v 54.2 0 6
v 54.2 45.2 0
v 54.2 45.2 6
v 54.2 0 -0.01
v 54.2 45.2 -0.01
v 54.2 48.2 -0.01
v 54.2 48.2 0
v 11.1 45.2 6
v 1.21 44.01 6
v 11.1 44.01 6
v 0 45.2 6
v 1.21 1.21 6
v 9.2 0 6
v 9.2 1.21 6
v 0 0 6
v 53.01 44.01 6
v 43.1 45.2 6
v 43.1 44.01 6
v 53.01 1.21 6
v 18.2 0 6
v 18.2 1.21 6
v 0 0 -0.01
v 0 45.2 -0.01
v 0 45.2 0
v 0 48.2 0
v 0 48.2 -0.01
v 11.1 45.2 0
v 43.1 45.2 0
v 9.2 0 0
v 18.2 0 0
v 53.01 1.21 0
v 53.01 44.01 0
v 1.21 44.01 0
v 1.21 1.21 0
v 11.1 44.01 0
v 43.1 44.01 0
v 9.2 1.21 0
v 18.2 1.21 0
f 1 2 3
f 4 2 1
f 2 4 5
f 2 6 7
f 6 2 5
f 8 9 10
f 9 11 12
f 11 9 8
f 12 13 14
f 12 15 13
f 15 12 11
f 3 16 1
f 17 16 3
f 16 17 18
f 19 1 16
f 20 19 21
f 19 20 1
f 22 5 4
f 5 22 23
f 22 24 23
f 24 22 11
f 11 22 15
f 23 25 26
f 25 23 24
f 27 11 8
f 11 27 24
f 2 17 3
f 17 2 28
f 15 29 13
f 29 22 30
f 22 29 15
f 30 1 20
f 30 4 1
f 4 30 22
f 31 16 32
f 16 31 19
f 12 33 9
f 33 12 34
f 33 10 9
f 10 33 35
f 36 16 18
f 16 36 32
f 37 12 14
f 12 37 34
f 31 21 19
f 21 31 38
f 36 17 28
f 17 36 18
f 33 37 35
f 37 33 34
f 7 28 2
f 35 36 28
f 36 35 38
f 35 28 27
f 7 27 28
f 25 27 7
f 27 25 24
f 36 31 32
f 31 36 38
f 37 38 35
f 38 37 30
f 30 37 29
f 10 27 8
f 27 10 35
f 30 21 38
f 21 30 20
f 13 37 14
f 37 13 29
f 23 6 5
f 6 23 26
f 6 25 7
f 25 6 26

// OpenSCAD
// file: ../Base/Boxes.scad
// Fischertechnik Box Foundation
// Pre-designed Boxes

use <Constants.scad>

include <PlacementOptions.scad>

box190Width = 190;
box190Depth = 130;
box130Width = 130;
box130Depth = 95;

// Values are from an original ec3 box
topBottomDifference = 1.5;
outerHeight = 40;
baseThickness = 1.8;
innerHeight = outerHeight - baseThickness;
stackExcess = 5.7;
radius = 3.5;
wallThickness = 1.5;
tolerance = 0.2;

boxWallThickness = wallThickness;
boxBaseThickness = baseThickness;
boxWebWidth = 3.0;

// getBoxWallThickness()
// Gets the wall thickness of a Fischertechnik Box
function getBoxWallThickness() = boxWallThickness;

// getBoxUsageHeight(height = 38.2)
// Gets the usable height of a Fischertechnik box
// height = Outer height of the box from the bottom to the upper edge.
function getBoxUsageHeight(height = outerHeight) = height - baseThickness - stackExcess;

// getBoxInnerHeight()
// Gets the inner height of a Fischertechnik box, including the stack excess
function getBoxInnerHeight() = innerHeight;

// getBoxBaseThickness()
// Gets the thickness of the Fischertechnik box base.
function getBoxBaseThickness() = boxBaseThickness;

// getBoxWebWidth()
// Gets the width of a box web
function getBoxWebWidth() = boxWebWidth;

// getBox190Space()
// Gets the usable inner space of a Box 190 as an x/y-list
function getBox190Space() = [
    box190Width - 2*getBoxWallThickness() - topBottomDifference, 
    box190Depth - 2*getBoxWallThickness() - topBottomDifference ];

// RoundedCornerPlate(width, depth, height, radius)
// Creates a body plate with rounded corners for a box. Used
// also to create the complete box with the hull module.
// width = Width of the plate
// depth = depth of the plate 
// height = thickness of the plate
// radius = radius of the rounded corner
module RoundedCornerPlate(width, depth, height, radius) {
    translate([radius, radius])
    hull() {
        w = width-2*radius;
        d = depth-2*radius;
        cube([w, d, height]);
        cylinder(height, r=radius, $fn=getFragments());
        translate([w, 0])
            cylinder(height, r=radius, $fn=getFragments());
        translate([w, d])
            cylinder(height, r=radius, $fn=getFragments());
        translate([0, d])
            cylinder(height, r=radius, $fn=getFragments());
    }
}

// BoxBase(width, depth)
// Creates an empty stackable Fischertechnik compatible box
// width = Outer width of the box (190, 130, ...)
// depth = Outer depth of the box (130, 95, ...)

module BoxBase(width, depth, height=outerHeight) {    
    thinPlate = 0.01;

    innerHeight = height - baseThickness;    
    
    module Body(tolerance=tolerance) {
        hull() {
            // Bottom with tolerance to fit into the original boxes when stacked
            translate([-wallThickness+tolerance, -wallThickness+tolerance, -baseThickness])
                RoundedCornerPlate(width-topBottomDifference-2*tolerance, depth-topBottomDifference-2*tolerance, thinPlate, radius);
            
            // Top
            translate([-wallThickness-topBottomDifference/2, -wallThickness-topBottomDifference/2, innerHeight-thinPlate])
                RoundedCornerPlate(width, depth, thinPlate, radius);
         }
    }

    module Cutoff() {
        hull() {
            coWidth = width - 2*wallThickness;
            coDepth = depth - 2*wallThickness;
            
            // Bottom
            RoundedCornerPlate(coWidth-topBottomDifference, coDepth-topBottomDifference, thinPlate, radius);

            // Top
            translate([-topBottomDifference/2, -topBottomDifference/2, innerHeight+thinPlate]) 
                RoundedCornerPlate(coWidth, coDepth, thinPlate, radius);
        }
    }
    
    difference() {        
        Body();
        Cutoff();
        stackOffset = innerHeight - stackExcess;
        translate([0, 0, stackOffset + baseThickness])
            Body(tolerance=0);
    }
}

// Creates the Fischertechnik empty box 130x190 mm and places it at position 0,0
// 190x130 are the outer sizes, the inner space is slightly smaller. Use getBox190Space() to get the inner sizes.
// The box is positioned that the usable inner space is at the 0,0,0 position.

module Box190() {
    BoxBase(box190Width, box190Depth);
}

// Gets the usable inner space of a Box 130 as an x/y-list
function getBox130Space() = [
    box130Width - 2*getBoxWallThickness() - topBottomDifference, 
    box130Depth - 2*getBoxWallThickness() - topBottomDifference ];

// Creates the Fischertechnik empty box 95x130 mm and places it at position 0,0
// 190x130 are the outer sizes, the inner space is slightly smaller. Use getBox190Space() to get the inner sizes.
// The box is positioned that the usable inner space is at the 0,0,0 position.

module Box130() {
    BoxBase(box130Width, box130Depth);
}

// Creates a web at the specified box walls
// corner 0 = LowerLeft, 1 = UpperLeft, 2 = UpperRight, 3 = LowerRight
// side 0 = LeftOfCorner, 1 = RightOfCorner
// distance = Distance in mm from the corner
// boxSpace = inner width and depth of the box (default: Box 190)
// webWidth = length of the web (default is 3 mms)
// webThickness = thickness of the web (default is 1 mm)
// height = Height of the web (standard is getBoxUsageHeight())
// sink = How much of the web is sunk into the wall

module BoxWeb(
    corner, 
    side, 
    distance, 
    boxSpace=getBox190Space(), 
    webWidth=getBoxWebWidth(), 
    webThickness=1.0, 
    height=getBoxUsageHeight(),
    sink = getBoxWallThickness()/2) {
    width = (corner % 2 == 0) ? 
            (side == LeftOfCorner ? webWidth : webThickness) :
            (side == LeftOfCorner ? webThickness : webWidth);

    depth = (corner % 2 == 0) ? 
            (side == RightOfCorner ? webWidth : webThickness) :
            (side == RightOfCorner ? webThickness : webWidth);
    
    xDiff = corner == LowerLeft ? 
                (side == LeftOfCorner ? -sink : distance) :
            (corner == UpperLeft ?                
                (side == LeftOfCorner ? distance : -sink) :
            (corner == UpperRight ?
                (side == LeftOfCorner ? boxSpace.x-webWidth+sink : boxSpace.x-distance-webThickness) :
                (side == LeftOfCorner ? boxSpace.x-distance-webThickness: boxSpace.x-webWidth+sink)));

    yDiff = corner == LowerLeft ? 
                (side == RightOfCorner ? -sink : distance) :
            (corner == UpperLeft ?
                (side == RightOfCorner ? boxSpace.y-distance-webThickness : boxSpace.y-webWidth+sink) :
            (corner == UpperRight ?
                (side == RightOfCorner ? boxSpace.y-webWidth+sink : boxSpace.y-distance-webThickness) :
                (side == RightOfCorner ? distance : -sink)));
    
    translate([xDiff, yDiff, -getExcess()])
        cube([width, depth, height + 2*getExcess()]);
}
// file: ../Base/Rotation.scad
// Fischertechnik Box Foundation
// Geometry Helpers Rotation

include <PlacementOptions.scad>

// getRotatedSpace(space, rotation=NoRotation)
// Rotates the space dependent on the specified rotation

function getRotatedSpace(space, rotation=NoRotation) = [
    (rotation == Rotate90 || rotation == Rotate270) ? space.y : space.x,
    (rotation == Rotate90 || rotation == Rotate270) ? space.x : space.y
];

// Rotates the given space around the fixed left lower corner
// space = the space the children needs as width/depth list [width,depth]
// rotation = 0 Rotate0 degrees, 1 Rotate90 degrees, 2 Rotate180 degrees, 3 Rotate270 degrees (equivalent to -90)

module RotateFix(space, rotation=NoRotation) {
    dy = (rotation == Rotate0 || rotation == Rotate270) ? 0 :
        (rotation == Rotate90) ? space.x :
        space.y;
    dx = (rotation < Rotate180) ? 0 :
        (rotation == Rotate180) ? space.x :
        space.y;
    
    translate([dx, dy, 0])
        rotate([0, 0, rotations[rotation]])
            children();
}
// file: ../Base/Alignment.scad
// Fischertechnik Box Foundation
// Geometry Helpers Alignment

include <PlacementOptions.scad>

// getAlignedX(elementWidth, spaceWidth, align=AlignRight, offset=0)
// Gets the aligned X offset of an element with the given
// width in the given space.
// elementWidth = The width of the element to positon
// spaceWidth = The space where the element should be aligned
// align = 0 AlignLeft, 1 AlignCenter, 2 AlignRight
// offset = an optional offset from the aligned position. When
// aligned left or centered, then positive values are in X direction.
// When aligned right then positive values are in negative X direction.

function getAlignedX(elementWidth, spaceWidth, align=AlignRight, offset=0) =
    (align == AlignLeft) ?
        offset :
        ((align == AlignCenter) ?
        (spaceWidth - elementWidth)/2 + offset :
        spaceWidth - offset - elementWidth);

// getAlignedY(elementDepth, spaceDepth, align=AlignTop, offset=0)
// Gets the aligned Y offset of an element with the given
// depth in the given space.
// elementDepth = The depth of the element to positon
// spaceDepth = The space where the element should be aligned
// align = 0 AlignBottom, 1 AlignCenter, 2 AlignTop
// offset = an optional offset from the aligned position. When
// aligned bottom or centered, then positive values are in Y direction.
// When aligned top then positive values are in negative Y direction.

function getAlignedY(elementDepth, spaceDepth, align=AlignTop, offset=0) =
    (align == AlignBottom) ?
        offset :
        ((align == AlignCenter) ?
        (spaceDepth - elementDepth)/2 + offset :
        spaceDepth - offset - elementDepth);
// file: ../Base/PlacementOptions.scad
// Fischertechnik Box Foundation
// Placement Options

// Alignment
NoAlign = 0;
AlignLeft = 1;
AlignBottom = 2;
AlignCenter = 3;
AlignRight = 4;
AlignTop = 5;

// Element rotation degree steps
rotations = [0, -90, -180, -270];

// Rotation
NoRotation = 0;
Rotate0 = 0;
Rotate90 = 1;
Rotate180 = 2;
Rotate270 = 3;

// Docking (seen from above)
NoDock = -1;
DockLeft = 0;
DockTop = 1;
DockRight = 2;
DockCorner = 2;
DockBottom = 3;

// Web corners
LowerLeft = 0;
UpperLeft = 1;
UpperRight = 2;
LowerRight = 3;

// Web position relative to corner
LeftOfCorner = 0;
RightOfCorner = 1;
// file: ../Base/Placement.scad
// Fischertechnik Box Foundation
// Geometry Helpers Placement

use <Constants.scad>
use <Alignment.scad>
use <Rotation.scad>
use <Boxes.scad>

include <PlacementOptions.scad>

// Place(x=0, y=0, elementSpace=[0,0], alignX=AlignLeft, alignY=AlignBottom, rotation=Rotate0, boxSpace=getBox190Space())
// Places the child at the specified position
// y = Y-Position. This is a relative position when an X aligment is specified.
// x = X-Position. This is a relative position when an Y aligment is specified.
// elementSpace = space of the element to be placed [x,y]
// alignX = -1=NoAlign, 0 AlignLeft, 1 AlignCenter, 3 AlignRight (elementSpace and boxSpace required!)
// alignY = -1=NoAlign, 2 AlignBottom, 1 AlignCenter, 4 AlignTop (elementSpace and boxSpace required!)
// rotation = 0 Rotate0 0 degrees, 1 Rotate90 90 degrees, 
// 2 Rotate180 180 degrees, 3 Rotate270 270 degrees (equivalent to -90)
// boxSpace = Inner space of the box where the placement occurs [x,y] - default is Box 190x130 inner space

module Place(x=0, y=0, elementSpace=[0,0], 
  alignX=AlignLeft, alignY=AlignBottom, 
  rotation=NoRotation, boxSpace=getBox190Space()) {

    module Position(x, y, space, rotation=Rotate0) {
        translate([x, y, 0])
            RotateFix(space, rotation)
                children();
    }

    space = getRotatedSpace(elementSpace, rotation);
    alignedX = getAlignedX(space.x, boxSpace.x, alignX, x);
    alignedY = getAlignedY(space.y, boxSpace.y, alignY, y);
    Position(alignedX, alignedY, elementSpace, rotation)
        children();
}

// Center(space=getBox130Space(), elementSpace=[0,0])
// space = Space where the children is centered. For cylinder use centered=true and no elementSpace.
// elementSpace = space of the element to be centered [x,y]

module Center(space=getBox190Space(), elementSpace=[0,0]) {
    Place(elementSpace=elementSpace, boxSpace=space, alignX=AlignCenter, alignY=AlignCenter)
        children();
}

// CenterHorizontal(width=0, y=0, offset=0, space=getBox130Space())
// width = Width of the element to be placed.
// y = Y position of the element
// offset = Offset from the center position (negative will be left of the center)
// space = Space where the element is placed

module CenterHorizontal(width=0, y=0, offset=0, space=getBox190Space()) {
    Place(x=offset, y=y, elementSpace=[width, 0], boxSpace=space, alignX=AlignCenter)
        children(0);
}

// CenterVertical(depth=0, x=0, offset=0, space=getBox130Space())
// depth = Depth of the element to be placed.
// x = X position of the element
// offset = Offset from the center position (negative will be down of the center)
// space = Space where the element is placed

module CenterVertical(depth=0, x=0, offset=0, space=getBox190Space()) {
    Place(x=x, y=offset, elementSpace=[0, depth], boxSpace=space, alignY=AlignCenter)
        children(0);
}

// getIsVertical(align)
// True if the specified alignment needs a vertical orientation for a divider (AlignRight, AlignLeft)

function getIsVertical(align) = (align == AlignRight || align == AlignLeft);

// getIsHorizontal(align)
// True if the specified alignment needs a horizontal orientation for a divider (AlignTop, AlignBottom)

function getIsHorizontal(align) = (align == AlignTop || align == AlignBottom);
// file: ../Base/Constants.scad
// Fischertechnik Box Foundation
// Constants

// Constant values necessary for multiple elements

// Base constants
dividerThickness = 1.2;
excess = 0.01;
fragments = 90;
tolerance = 0.8;

// Gets the thickness of a divider 
function getDividerThickness() = dividerThickness;

// Gets the excess that is used to merge walls into each other
function getExcess() = excess;

// Gets amount of fragments of a cylinder
function getFragments() = fragments;

// Gets the inner tolerance of a frame to each side
function getTolerance() = tolerance;


// Fischertechnik specific constants
axisDiameter = 4;
axisBottomDiameter = axisDiameter + 1;
axisTolerance = 0.2;

// Gets axis diameter of Fischertechnik axis
function getAxisDiameter() = axisDiameter;

// Gets axis diameter tolerance (subtracted for element axis)
function getAxisTolerance() = axisTolerance;

// Gets the axis diameter for standing axis
function getStandAxisDiameter() = getAxisDiameter() - getAxisTolerance();

// Gets axis bottom diameter for thicker part at the bottom
function getAxisBottomDiameter() = axisBottomDiameter;

pinHeight = 2.5;

// gets the height of a connecting pin
function getPinHeight() = pinHeight;

standardEdgeDistance = 2.5;
standardWebDistance = 11.5;
standardCornerLength = 15;

// gets the standard distance to the wall of the box for dockable frames with webs
function getStandardEdgeDistance() = standardEdgeDistance;

// gets the standard distance of each web to the corner of the dockable frame
function getStandardWebDistance() = standardWebDistance;

// gets the standard length of the corner walls of a dockable frame
function getStandardCornerLength() = standardCornerLength;

tubeWallFactor = 0.8;

// gets the wall thickness of a tube.
function getTubeWallThickness() = tubeWallFactor * getDividerThickness();

smallPartsFrameHeight = 20;

// gets the frame height for docked small parts boxes.
function getSmallPartsFrameHeight() = smallPartsFrameHeight;

hubRingDiameter = 19.5;
hubRingLevelDiameter = 21;

// gets the diameter of a tube matching the inner ring of a wheel
function getHubRingDiameter() = hubRingDiameter;

// gets the diameter of a hub tube with a thicker diameter
function getHubRingLevelDiameter() = hubRingLevelDiameter;
// main file
// Fischertechnik Box Library
// Frame for Motor 6V
// 31039

use <../Base/Constants.scad>
use <../Base/Placement.scad>
use <../ModelBase/Simple.scad>

include <../Base/PlacementOptions.scad>

/* [Hidden] */
width = 51;
depth = 42;
height = 6;

connectionDepth = 3;

// getFrameUniversalJointCardanSpace()
// Gets the complete space of the 6V motor frame

function getFrameMotor6VSpace() = getFrameOuterVolume([width, depth + connectionDepth, height]);

// FrameMotor6V()
// Frame for the 6V standard motor (as mot1)

module FrameMotor6V() {
    Space(getFrameMotor6VSpace());
    difference() {
        Frame([width, depth, height]);
    
        connectorCutoffWidth = 32;
        connectCutoffVolume = [connectorCutoffWidth, 6, height + 1];
        Place(
            boxSpace=getFrameMotor6VSpace(), 
            elementSpace=connectCutoffVolume,
            alignX=AlignCenter, alignY=AlignTop)
            cube(connectCutoffVolume);
        
        cableCutoffWidth = 9;
        cableCutoffOffset = 8;
        cableCutoffVolume = [cableCutoffWidth, 2*getDividerThickness(), height + 1];
        Place(
            x=cableCutoffOffset + getDividerThickness(),
            y = -getDividerThickness()/2,
            boxSpace=getFrameMotor6VSpace(), 
            elementSpace=cableCutoffVolume)
            cube(cableCutoffVolume);        
    }
}

// Test
color("lightgray")
FrameMotor6V();
